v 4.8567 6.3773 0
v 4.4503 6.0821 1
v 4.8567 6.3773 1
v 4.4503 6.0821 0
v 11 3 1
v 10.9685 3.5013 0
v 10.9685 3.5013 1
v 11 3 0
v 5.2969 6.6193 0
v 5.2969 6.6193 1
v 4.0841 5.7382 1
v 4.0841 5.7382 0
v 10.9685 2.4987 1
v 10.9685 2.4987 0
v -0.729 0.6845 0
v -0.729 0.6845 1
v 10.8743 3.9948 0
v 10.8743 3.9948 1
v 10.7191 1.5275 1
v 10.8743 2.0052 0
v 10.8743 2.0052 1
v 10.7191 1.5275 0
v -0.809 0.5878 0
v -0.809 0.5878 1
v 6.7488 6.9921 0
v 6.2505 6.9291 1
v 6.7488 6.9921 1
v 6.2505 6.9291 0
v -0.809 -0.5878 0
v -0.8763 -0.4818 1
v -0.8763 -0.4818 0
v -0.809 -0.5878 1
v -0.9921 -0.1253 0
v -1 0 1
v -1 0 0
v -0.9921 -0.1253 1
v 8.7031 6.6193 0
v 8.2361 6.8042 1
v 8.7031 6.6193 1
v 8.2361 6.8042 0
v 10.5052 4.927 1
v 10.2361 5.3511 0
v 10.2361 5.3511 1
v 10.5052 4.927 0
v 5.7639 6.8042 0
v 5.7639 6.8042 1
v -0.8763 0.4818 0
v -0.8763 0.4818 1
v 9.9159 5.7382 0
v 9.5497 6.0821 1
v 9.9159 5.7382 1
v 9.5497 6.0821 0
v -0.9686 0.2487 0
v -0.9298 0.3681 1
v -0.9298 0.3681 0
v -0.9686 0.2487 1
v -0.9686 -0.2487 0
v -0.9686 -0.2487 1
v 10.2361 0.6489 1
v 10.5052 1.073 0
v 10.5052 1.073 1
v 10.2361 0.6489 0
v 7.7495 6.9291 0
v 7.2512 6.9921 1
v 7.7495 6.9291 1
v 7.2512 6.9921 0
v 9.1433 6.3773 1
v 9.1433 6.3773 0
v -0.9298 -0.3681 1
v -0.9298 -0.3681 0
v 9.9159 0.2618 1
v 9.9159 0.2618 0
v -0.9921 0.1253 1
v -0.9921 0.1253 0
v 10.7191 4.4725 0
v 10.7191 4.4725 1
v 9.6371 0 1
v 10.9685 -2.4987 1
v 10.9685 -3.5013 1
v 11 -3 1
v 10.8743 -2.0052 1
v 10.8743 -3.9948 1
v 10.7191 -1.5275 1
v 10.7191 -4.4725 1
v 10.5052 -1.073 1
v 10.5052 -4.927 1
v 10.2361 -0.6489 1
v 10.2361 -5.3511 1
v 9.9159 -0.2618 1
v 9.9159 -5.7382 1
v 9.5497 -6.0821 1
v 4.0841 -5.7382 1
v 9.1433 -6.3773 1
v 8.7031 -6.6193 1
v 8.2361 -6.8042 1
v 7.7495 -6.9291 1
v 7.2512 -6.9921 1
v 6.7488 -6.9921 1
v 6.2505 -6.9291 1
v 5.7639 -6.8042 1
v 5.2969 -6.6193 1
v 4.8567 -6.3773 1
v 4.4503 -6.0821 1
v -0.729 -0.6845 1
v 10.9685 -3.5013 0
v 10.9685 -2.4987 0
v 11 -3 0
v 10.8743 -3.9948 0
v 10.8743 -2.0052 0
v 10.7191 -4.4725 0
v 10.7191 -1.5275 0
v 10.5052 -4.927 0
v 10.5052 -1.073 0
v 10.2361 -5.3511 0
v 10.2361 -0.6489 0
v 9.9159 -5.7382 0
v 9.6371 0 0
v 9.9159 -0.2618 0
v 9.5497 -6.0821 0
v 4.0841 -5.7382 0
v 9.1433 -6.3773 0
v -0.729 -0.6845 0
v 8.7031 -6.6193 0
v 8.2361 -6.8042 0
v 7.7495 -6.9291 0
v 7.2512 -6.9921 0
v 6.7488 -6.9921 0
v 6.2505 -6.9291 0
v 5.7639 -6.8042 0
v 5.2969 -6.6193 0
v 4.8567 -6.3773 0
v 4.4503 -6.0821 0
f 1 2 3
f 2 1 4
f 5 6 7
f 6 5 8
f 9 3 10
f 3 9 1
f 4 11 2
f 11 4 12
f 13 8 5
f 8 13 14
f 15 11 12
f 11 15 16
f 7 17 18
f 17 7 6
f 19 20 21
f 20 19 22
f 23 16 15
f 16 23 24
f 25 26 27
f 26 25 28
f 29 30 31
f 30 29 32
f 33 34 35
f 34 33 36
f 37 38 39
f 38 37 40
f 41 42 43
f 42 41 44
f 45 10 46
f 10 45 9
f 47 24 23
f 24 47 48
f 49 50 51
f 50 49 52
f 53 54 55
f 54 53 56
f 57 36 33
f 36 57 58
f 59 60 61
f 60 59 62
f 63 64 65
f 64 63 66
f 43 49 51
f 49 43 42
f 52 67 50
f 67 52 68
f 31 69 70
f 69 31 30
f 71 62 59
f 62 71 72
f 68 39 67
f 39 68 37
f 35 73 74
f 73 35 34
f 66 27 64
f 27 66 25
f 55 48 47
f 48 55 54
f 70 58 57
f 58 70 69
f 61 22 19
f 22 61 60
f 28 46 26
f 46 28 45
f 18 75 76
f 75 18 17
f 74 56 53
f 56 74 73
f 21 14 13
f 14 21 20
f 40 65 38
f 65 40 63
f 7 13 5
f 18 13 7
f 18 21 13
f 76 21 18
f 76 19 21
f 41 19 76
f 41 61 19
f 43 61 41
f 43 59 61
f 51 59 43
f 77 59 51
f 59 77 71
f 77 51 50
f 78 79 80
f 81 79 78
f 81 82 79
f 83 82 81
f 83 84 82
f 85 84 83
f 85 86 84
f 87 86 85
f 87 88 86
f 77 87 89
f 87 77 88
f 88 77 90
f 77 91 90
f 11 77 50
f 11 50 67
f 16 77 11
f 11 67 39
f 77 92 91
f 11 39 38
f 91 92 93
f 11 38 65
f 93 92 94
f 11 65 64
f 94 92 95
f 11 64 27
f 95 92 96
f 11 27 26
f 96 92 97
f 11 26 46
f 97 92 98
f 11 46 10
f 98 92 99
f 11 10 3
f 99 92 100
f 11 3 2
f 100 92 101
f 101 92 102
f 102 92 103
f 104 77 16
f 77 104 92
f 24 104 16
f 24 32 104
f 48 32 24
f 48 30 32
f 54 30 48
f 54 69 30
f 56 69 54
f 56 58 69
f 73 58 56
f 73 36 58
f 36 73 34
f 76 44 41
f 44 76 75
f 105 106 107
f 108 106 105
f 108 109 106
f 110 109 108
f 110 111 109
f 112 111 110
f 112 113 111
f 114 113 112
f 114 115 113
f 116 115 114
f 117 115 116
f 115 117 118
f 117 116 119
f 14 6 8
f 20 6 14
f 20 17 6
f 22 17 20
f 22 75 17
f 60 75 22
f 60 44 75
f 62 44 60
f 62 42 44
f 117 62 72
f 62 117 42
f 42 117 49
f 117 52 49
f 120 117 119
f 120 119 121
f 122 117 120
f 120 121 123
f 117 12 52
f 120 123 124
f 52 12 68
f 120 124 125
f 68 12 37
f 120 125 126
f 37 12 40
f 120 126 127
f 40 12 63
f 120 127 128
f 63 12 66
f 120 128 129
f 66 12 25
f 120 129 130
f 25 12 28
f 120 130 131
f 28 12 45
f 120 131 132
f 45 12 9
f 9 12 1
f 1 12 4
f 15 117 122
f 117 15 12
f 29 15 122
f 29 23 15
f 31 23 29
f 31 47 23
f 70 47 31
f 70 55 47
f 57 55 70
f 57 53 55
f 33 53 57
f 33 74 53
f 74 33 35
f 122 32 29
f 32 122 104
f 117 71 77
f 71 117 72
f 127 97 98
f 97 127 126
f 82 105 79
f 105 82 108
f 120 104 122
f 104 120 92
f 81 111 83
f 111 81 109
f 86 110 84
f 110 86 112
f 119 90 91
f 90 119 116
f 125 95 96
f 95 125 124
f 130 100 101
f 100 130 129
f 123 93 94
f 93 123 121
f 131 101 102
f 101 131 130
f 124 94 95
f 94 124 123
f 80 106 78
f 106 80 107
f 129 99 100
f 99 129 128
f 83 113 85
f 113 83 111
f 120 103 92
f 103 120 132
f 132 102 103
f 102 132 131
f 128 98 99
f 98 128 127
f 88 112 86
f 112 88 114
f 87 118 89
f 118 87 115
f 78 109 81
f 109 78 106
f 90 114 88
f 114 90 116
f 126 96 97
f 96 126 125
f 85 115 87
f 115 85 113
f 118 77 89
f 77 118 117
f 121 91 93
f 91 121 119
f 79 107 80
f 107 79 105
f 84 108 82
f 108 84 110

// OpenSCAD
//Transforming Shapes - Design Time: Heart

$fn = 50;

hull() {
    cylinder(h=1, r1=1, r2=1);
    translate([7, 3, 0]) cylinder(h=1, r1=4, r2=4);
}
mirror([0, 1, 0]) hull() {
    cylinder(h=1, r1=1, r2=1);
    translate([7, 3, 0]) cylinder(h=1, r1=4, r2=4);
}
